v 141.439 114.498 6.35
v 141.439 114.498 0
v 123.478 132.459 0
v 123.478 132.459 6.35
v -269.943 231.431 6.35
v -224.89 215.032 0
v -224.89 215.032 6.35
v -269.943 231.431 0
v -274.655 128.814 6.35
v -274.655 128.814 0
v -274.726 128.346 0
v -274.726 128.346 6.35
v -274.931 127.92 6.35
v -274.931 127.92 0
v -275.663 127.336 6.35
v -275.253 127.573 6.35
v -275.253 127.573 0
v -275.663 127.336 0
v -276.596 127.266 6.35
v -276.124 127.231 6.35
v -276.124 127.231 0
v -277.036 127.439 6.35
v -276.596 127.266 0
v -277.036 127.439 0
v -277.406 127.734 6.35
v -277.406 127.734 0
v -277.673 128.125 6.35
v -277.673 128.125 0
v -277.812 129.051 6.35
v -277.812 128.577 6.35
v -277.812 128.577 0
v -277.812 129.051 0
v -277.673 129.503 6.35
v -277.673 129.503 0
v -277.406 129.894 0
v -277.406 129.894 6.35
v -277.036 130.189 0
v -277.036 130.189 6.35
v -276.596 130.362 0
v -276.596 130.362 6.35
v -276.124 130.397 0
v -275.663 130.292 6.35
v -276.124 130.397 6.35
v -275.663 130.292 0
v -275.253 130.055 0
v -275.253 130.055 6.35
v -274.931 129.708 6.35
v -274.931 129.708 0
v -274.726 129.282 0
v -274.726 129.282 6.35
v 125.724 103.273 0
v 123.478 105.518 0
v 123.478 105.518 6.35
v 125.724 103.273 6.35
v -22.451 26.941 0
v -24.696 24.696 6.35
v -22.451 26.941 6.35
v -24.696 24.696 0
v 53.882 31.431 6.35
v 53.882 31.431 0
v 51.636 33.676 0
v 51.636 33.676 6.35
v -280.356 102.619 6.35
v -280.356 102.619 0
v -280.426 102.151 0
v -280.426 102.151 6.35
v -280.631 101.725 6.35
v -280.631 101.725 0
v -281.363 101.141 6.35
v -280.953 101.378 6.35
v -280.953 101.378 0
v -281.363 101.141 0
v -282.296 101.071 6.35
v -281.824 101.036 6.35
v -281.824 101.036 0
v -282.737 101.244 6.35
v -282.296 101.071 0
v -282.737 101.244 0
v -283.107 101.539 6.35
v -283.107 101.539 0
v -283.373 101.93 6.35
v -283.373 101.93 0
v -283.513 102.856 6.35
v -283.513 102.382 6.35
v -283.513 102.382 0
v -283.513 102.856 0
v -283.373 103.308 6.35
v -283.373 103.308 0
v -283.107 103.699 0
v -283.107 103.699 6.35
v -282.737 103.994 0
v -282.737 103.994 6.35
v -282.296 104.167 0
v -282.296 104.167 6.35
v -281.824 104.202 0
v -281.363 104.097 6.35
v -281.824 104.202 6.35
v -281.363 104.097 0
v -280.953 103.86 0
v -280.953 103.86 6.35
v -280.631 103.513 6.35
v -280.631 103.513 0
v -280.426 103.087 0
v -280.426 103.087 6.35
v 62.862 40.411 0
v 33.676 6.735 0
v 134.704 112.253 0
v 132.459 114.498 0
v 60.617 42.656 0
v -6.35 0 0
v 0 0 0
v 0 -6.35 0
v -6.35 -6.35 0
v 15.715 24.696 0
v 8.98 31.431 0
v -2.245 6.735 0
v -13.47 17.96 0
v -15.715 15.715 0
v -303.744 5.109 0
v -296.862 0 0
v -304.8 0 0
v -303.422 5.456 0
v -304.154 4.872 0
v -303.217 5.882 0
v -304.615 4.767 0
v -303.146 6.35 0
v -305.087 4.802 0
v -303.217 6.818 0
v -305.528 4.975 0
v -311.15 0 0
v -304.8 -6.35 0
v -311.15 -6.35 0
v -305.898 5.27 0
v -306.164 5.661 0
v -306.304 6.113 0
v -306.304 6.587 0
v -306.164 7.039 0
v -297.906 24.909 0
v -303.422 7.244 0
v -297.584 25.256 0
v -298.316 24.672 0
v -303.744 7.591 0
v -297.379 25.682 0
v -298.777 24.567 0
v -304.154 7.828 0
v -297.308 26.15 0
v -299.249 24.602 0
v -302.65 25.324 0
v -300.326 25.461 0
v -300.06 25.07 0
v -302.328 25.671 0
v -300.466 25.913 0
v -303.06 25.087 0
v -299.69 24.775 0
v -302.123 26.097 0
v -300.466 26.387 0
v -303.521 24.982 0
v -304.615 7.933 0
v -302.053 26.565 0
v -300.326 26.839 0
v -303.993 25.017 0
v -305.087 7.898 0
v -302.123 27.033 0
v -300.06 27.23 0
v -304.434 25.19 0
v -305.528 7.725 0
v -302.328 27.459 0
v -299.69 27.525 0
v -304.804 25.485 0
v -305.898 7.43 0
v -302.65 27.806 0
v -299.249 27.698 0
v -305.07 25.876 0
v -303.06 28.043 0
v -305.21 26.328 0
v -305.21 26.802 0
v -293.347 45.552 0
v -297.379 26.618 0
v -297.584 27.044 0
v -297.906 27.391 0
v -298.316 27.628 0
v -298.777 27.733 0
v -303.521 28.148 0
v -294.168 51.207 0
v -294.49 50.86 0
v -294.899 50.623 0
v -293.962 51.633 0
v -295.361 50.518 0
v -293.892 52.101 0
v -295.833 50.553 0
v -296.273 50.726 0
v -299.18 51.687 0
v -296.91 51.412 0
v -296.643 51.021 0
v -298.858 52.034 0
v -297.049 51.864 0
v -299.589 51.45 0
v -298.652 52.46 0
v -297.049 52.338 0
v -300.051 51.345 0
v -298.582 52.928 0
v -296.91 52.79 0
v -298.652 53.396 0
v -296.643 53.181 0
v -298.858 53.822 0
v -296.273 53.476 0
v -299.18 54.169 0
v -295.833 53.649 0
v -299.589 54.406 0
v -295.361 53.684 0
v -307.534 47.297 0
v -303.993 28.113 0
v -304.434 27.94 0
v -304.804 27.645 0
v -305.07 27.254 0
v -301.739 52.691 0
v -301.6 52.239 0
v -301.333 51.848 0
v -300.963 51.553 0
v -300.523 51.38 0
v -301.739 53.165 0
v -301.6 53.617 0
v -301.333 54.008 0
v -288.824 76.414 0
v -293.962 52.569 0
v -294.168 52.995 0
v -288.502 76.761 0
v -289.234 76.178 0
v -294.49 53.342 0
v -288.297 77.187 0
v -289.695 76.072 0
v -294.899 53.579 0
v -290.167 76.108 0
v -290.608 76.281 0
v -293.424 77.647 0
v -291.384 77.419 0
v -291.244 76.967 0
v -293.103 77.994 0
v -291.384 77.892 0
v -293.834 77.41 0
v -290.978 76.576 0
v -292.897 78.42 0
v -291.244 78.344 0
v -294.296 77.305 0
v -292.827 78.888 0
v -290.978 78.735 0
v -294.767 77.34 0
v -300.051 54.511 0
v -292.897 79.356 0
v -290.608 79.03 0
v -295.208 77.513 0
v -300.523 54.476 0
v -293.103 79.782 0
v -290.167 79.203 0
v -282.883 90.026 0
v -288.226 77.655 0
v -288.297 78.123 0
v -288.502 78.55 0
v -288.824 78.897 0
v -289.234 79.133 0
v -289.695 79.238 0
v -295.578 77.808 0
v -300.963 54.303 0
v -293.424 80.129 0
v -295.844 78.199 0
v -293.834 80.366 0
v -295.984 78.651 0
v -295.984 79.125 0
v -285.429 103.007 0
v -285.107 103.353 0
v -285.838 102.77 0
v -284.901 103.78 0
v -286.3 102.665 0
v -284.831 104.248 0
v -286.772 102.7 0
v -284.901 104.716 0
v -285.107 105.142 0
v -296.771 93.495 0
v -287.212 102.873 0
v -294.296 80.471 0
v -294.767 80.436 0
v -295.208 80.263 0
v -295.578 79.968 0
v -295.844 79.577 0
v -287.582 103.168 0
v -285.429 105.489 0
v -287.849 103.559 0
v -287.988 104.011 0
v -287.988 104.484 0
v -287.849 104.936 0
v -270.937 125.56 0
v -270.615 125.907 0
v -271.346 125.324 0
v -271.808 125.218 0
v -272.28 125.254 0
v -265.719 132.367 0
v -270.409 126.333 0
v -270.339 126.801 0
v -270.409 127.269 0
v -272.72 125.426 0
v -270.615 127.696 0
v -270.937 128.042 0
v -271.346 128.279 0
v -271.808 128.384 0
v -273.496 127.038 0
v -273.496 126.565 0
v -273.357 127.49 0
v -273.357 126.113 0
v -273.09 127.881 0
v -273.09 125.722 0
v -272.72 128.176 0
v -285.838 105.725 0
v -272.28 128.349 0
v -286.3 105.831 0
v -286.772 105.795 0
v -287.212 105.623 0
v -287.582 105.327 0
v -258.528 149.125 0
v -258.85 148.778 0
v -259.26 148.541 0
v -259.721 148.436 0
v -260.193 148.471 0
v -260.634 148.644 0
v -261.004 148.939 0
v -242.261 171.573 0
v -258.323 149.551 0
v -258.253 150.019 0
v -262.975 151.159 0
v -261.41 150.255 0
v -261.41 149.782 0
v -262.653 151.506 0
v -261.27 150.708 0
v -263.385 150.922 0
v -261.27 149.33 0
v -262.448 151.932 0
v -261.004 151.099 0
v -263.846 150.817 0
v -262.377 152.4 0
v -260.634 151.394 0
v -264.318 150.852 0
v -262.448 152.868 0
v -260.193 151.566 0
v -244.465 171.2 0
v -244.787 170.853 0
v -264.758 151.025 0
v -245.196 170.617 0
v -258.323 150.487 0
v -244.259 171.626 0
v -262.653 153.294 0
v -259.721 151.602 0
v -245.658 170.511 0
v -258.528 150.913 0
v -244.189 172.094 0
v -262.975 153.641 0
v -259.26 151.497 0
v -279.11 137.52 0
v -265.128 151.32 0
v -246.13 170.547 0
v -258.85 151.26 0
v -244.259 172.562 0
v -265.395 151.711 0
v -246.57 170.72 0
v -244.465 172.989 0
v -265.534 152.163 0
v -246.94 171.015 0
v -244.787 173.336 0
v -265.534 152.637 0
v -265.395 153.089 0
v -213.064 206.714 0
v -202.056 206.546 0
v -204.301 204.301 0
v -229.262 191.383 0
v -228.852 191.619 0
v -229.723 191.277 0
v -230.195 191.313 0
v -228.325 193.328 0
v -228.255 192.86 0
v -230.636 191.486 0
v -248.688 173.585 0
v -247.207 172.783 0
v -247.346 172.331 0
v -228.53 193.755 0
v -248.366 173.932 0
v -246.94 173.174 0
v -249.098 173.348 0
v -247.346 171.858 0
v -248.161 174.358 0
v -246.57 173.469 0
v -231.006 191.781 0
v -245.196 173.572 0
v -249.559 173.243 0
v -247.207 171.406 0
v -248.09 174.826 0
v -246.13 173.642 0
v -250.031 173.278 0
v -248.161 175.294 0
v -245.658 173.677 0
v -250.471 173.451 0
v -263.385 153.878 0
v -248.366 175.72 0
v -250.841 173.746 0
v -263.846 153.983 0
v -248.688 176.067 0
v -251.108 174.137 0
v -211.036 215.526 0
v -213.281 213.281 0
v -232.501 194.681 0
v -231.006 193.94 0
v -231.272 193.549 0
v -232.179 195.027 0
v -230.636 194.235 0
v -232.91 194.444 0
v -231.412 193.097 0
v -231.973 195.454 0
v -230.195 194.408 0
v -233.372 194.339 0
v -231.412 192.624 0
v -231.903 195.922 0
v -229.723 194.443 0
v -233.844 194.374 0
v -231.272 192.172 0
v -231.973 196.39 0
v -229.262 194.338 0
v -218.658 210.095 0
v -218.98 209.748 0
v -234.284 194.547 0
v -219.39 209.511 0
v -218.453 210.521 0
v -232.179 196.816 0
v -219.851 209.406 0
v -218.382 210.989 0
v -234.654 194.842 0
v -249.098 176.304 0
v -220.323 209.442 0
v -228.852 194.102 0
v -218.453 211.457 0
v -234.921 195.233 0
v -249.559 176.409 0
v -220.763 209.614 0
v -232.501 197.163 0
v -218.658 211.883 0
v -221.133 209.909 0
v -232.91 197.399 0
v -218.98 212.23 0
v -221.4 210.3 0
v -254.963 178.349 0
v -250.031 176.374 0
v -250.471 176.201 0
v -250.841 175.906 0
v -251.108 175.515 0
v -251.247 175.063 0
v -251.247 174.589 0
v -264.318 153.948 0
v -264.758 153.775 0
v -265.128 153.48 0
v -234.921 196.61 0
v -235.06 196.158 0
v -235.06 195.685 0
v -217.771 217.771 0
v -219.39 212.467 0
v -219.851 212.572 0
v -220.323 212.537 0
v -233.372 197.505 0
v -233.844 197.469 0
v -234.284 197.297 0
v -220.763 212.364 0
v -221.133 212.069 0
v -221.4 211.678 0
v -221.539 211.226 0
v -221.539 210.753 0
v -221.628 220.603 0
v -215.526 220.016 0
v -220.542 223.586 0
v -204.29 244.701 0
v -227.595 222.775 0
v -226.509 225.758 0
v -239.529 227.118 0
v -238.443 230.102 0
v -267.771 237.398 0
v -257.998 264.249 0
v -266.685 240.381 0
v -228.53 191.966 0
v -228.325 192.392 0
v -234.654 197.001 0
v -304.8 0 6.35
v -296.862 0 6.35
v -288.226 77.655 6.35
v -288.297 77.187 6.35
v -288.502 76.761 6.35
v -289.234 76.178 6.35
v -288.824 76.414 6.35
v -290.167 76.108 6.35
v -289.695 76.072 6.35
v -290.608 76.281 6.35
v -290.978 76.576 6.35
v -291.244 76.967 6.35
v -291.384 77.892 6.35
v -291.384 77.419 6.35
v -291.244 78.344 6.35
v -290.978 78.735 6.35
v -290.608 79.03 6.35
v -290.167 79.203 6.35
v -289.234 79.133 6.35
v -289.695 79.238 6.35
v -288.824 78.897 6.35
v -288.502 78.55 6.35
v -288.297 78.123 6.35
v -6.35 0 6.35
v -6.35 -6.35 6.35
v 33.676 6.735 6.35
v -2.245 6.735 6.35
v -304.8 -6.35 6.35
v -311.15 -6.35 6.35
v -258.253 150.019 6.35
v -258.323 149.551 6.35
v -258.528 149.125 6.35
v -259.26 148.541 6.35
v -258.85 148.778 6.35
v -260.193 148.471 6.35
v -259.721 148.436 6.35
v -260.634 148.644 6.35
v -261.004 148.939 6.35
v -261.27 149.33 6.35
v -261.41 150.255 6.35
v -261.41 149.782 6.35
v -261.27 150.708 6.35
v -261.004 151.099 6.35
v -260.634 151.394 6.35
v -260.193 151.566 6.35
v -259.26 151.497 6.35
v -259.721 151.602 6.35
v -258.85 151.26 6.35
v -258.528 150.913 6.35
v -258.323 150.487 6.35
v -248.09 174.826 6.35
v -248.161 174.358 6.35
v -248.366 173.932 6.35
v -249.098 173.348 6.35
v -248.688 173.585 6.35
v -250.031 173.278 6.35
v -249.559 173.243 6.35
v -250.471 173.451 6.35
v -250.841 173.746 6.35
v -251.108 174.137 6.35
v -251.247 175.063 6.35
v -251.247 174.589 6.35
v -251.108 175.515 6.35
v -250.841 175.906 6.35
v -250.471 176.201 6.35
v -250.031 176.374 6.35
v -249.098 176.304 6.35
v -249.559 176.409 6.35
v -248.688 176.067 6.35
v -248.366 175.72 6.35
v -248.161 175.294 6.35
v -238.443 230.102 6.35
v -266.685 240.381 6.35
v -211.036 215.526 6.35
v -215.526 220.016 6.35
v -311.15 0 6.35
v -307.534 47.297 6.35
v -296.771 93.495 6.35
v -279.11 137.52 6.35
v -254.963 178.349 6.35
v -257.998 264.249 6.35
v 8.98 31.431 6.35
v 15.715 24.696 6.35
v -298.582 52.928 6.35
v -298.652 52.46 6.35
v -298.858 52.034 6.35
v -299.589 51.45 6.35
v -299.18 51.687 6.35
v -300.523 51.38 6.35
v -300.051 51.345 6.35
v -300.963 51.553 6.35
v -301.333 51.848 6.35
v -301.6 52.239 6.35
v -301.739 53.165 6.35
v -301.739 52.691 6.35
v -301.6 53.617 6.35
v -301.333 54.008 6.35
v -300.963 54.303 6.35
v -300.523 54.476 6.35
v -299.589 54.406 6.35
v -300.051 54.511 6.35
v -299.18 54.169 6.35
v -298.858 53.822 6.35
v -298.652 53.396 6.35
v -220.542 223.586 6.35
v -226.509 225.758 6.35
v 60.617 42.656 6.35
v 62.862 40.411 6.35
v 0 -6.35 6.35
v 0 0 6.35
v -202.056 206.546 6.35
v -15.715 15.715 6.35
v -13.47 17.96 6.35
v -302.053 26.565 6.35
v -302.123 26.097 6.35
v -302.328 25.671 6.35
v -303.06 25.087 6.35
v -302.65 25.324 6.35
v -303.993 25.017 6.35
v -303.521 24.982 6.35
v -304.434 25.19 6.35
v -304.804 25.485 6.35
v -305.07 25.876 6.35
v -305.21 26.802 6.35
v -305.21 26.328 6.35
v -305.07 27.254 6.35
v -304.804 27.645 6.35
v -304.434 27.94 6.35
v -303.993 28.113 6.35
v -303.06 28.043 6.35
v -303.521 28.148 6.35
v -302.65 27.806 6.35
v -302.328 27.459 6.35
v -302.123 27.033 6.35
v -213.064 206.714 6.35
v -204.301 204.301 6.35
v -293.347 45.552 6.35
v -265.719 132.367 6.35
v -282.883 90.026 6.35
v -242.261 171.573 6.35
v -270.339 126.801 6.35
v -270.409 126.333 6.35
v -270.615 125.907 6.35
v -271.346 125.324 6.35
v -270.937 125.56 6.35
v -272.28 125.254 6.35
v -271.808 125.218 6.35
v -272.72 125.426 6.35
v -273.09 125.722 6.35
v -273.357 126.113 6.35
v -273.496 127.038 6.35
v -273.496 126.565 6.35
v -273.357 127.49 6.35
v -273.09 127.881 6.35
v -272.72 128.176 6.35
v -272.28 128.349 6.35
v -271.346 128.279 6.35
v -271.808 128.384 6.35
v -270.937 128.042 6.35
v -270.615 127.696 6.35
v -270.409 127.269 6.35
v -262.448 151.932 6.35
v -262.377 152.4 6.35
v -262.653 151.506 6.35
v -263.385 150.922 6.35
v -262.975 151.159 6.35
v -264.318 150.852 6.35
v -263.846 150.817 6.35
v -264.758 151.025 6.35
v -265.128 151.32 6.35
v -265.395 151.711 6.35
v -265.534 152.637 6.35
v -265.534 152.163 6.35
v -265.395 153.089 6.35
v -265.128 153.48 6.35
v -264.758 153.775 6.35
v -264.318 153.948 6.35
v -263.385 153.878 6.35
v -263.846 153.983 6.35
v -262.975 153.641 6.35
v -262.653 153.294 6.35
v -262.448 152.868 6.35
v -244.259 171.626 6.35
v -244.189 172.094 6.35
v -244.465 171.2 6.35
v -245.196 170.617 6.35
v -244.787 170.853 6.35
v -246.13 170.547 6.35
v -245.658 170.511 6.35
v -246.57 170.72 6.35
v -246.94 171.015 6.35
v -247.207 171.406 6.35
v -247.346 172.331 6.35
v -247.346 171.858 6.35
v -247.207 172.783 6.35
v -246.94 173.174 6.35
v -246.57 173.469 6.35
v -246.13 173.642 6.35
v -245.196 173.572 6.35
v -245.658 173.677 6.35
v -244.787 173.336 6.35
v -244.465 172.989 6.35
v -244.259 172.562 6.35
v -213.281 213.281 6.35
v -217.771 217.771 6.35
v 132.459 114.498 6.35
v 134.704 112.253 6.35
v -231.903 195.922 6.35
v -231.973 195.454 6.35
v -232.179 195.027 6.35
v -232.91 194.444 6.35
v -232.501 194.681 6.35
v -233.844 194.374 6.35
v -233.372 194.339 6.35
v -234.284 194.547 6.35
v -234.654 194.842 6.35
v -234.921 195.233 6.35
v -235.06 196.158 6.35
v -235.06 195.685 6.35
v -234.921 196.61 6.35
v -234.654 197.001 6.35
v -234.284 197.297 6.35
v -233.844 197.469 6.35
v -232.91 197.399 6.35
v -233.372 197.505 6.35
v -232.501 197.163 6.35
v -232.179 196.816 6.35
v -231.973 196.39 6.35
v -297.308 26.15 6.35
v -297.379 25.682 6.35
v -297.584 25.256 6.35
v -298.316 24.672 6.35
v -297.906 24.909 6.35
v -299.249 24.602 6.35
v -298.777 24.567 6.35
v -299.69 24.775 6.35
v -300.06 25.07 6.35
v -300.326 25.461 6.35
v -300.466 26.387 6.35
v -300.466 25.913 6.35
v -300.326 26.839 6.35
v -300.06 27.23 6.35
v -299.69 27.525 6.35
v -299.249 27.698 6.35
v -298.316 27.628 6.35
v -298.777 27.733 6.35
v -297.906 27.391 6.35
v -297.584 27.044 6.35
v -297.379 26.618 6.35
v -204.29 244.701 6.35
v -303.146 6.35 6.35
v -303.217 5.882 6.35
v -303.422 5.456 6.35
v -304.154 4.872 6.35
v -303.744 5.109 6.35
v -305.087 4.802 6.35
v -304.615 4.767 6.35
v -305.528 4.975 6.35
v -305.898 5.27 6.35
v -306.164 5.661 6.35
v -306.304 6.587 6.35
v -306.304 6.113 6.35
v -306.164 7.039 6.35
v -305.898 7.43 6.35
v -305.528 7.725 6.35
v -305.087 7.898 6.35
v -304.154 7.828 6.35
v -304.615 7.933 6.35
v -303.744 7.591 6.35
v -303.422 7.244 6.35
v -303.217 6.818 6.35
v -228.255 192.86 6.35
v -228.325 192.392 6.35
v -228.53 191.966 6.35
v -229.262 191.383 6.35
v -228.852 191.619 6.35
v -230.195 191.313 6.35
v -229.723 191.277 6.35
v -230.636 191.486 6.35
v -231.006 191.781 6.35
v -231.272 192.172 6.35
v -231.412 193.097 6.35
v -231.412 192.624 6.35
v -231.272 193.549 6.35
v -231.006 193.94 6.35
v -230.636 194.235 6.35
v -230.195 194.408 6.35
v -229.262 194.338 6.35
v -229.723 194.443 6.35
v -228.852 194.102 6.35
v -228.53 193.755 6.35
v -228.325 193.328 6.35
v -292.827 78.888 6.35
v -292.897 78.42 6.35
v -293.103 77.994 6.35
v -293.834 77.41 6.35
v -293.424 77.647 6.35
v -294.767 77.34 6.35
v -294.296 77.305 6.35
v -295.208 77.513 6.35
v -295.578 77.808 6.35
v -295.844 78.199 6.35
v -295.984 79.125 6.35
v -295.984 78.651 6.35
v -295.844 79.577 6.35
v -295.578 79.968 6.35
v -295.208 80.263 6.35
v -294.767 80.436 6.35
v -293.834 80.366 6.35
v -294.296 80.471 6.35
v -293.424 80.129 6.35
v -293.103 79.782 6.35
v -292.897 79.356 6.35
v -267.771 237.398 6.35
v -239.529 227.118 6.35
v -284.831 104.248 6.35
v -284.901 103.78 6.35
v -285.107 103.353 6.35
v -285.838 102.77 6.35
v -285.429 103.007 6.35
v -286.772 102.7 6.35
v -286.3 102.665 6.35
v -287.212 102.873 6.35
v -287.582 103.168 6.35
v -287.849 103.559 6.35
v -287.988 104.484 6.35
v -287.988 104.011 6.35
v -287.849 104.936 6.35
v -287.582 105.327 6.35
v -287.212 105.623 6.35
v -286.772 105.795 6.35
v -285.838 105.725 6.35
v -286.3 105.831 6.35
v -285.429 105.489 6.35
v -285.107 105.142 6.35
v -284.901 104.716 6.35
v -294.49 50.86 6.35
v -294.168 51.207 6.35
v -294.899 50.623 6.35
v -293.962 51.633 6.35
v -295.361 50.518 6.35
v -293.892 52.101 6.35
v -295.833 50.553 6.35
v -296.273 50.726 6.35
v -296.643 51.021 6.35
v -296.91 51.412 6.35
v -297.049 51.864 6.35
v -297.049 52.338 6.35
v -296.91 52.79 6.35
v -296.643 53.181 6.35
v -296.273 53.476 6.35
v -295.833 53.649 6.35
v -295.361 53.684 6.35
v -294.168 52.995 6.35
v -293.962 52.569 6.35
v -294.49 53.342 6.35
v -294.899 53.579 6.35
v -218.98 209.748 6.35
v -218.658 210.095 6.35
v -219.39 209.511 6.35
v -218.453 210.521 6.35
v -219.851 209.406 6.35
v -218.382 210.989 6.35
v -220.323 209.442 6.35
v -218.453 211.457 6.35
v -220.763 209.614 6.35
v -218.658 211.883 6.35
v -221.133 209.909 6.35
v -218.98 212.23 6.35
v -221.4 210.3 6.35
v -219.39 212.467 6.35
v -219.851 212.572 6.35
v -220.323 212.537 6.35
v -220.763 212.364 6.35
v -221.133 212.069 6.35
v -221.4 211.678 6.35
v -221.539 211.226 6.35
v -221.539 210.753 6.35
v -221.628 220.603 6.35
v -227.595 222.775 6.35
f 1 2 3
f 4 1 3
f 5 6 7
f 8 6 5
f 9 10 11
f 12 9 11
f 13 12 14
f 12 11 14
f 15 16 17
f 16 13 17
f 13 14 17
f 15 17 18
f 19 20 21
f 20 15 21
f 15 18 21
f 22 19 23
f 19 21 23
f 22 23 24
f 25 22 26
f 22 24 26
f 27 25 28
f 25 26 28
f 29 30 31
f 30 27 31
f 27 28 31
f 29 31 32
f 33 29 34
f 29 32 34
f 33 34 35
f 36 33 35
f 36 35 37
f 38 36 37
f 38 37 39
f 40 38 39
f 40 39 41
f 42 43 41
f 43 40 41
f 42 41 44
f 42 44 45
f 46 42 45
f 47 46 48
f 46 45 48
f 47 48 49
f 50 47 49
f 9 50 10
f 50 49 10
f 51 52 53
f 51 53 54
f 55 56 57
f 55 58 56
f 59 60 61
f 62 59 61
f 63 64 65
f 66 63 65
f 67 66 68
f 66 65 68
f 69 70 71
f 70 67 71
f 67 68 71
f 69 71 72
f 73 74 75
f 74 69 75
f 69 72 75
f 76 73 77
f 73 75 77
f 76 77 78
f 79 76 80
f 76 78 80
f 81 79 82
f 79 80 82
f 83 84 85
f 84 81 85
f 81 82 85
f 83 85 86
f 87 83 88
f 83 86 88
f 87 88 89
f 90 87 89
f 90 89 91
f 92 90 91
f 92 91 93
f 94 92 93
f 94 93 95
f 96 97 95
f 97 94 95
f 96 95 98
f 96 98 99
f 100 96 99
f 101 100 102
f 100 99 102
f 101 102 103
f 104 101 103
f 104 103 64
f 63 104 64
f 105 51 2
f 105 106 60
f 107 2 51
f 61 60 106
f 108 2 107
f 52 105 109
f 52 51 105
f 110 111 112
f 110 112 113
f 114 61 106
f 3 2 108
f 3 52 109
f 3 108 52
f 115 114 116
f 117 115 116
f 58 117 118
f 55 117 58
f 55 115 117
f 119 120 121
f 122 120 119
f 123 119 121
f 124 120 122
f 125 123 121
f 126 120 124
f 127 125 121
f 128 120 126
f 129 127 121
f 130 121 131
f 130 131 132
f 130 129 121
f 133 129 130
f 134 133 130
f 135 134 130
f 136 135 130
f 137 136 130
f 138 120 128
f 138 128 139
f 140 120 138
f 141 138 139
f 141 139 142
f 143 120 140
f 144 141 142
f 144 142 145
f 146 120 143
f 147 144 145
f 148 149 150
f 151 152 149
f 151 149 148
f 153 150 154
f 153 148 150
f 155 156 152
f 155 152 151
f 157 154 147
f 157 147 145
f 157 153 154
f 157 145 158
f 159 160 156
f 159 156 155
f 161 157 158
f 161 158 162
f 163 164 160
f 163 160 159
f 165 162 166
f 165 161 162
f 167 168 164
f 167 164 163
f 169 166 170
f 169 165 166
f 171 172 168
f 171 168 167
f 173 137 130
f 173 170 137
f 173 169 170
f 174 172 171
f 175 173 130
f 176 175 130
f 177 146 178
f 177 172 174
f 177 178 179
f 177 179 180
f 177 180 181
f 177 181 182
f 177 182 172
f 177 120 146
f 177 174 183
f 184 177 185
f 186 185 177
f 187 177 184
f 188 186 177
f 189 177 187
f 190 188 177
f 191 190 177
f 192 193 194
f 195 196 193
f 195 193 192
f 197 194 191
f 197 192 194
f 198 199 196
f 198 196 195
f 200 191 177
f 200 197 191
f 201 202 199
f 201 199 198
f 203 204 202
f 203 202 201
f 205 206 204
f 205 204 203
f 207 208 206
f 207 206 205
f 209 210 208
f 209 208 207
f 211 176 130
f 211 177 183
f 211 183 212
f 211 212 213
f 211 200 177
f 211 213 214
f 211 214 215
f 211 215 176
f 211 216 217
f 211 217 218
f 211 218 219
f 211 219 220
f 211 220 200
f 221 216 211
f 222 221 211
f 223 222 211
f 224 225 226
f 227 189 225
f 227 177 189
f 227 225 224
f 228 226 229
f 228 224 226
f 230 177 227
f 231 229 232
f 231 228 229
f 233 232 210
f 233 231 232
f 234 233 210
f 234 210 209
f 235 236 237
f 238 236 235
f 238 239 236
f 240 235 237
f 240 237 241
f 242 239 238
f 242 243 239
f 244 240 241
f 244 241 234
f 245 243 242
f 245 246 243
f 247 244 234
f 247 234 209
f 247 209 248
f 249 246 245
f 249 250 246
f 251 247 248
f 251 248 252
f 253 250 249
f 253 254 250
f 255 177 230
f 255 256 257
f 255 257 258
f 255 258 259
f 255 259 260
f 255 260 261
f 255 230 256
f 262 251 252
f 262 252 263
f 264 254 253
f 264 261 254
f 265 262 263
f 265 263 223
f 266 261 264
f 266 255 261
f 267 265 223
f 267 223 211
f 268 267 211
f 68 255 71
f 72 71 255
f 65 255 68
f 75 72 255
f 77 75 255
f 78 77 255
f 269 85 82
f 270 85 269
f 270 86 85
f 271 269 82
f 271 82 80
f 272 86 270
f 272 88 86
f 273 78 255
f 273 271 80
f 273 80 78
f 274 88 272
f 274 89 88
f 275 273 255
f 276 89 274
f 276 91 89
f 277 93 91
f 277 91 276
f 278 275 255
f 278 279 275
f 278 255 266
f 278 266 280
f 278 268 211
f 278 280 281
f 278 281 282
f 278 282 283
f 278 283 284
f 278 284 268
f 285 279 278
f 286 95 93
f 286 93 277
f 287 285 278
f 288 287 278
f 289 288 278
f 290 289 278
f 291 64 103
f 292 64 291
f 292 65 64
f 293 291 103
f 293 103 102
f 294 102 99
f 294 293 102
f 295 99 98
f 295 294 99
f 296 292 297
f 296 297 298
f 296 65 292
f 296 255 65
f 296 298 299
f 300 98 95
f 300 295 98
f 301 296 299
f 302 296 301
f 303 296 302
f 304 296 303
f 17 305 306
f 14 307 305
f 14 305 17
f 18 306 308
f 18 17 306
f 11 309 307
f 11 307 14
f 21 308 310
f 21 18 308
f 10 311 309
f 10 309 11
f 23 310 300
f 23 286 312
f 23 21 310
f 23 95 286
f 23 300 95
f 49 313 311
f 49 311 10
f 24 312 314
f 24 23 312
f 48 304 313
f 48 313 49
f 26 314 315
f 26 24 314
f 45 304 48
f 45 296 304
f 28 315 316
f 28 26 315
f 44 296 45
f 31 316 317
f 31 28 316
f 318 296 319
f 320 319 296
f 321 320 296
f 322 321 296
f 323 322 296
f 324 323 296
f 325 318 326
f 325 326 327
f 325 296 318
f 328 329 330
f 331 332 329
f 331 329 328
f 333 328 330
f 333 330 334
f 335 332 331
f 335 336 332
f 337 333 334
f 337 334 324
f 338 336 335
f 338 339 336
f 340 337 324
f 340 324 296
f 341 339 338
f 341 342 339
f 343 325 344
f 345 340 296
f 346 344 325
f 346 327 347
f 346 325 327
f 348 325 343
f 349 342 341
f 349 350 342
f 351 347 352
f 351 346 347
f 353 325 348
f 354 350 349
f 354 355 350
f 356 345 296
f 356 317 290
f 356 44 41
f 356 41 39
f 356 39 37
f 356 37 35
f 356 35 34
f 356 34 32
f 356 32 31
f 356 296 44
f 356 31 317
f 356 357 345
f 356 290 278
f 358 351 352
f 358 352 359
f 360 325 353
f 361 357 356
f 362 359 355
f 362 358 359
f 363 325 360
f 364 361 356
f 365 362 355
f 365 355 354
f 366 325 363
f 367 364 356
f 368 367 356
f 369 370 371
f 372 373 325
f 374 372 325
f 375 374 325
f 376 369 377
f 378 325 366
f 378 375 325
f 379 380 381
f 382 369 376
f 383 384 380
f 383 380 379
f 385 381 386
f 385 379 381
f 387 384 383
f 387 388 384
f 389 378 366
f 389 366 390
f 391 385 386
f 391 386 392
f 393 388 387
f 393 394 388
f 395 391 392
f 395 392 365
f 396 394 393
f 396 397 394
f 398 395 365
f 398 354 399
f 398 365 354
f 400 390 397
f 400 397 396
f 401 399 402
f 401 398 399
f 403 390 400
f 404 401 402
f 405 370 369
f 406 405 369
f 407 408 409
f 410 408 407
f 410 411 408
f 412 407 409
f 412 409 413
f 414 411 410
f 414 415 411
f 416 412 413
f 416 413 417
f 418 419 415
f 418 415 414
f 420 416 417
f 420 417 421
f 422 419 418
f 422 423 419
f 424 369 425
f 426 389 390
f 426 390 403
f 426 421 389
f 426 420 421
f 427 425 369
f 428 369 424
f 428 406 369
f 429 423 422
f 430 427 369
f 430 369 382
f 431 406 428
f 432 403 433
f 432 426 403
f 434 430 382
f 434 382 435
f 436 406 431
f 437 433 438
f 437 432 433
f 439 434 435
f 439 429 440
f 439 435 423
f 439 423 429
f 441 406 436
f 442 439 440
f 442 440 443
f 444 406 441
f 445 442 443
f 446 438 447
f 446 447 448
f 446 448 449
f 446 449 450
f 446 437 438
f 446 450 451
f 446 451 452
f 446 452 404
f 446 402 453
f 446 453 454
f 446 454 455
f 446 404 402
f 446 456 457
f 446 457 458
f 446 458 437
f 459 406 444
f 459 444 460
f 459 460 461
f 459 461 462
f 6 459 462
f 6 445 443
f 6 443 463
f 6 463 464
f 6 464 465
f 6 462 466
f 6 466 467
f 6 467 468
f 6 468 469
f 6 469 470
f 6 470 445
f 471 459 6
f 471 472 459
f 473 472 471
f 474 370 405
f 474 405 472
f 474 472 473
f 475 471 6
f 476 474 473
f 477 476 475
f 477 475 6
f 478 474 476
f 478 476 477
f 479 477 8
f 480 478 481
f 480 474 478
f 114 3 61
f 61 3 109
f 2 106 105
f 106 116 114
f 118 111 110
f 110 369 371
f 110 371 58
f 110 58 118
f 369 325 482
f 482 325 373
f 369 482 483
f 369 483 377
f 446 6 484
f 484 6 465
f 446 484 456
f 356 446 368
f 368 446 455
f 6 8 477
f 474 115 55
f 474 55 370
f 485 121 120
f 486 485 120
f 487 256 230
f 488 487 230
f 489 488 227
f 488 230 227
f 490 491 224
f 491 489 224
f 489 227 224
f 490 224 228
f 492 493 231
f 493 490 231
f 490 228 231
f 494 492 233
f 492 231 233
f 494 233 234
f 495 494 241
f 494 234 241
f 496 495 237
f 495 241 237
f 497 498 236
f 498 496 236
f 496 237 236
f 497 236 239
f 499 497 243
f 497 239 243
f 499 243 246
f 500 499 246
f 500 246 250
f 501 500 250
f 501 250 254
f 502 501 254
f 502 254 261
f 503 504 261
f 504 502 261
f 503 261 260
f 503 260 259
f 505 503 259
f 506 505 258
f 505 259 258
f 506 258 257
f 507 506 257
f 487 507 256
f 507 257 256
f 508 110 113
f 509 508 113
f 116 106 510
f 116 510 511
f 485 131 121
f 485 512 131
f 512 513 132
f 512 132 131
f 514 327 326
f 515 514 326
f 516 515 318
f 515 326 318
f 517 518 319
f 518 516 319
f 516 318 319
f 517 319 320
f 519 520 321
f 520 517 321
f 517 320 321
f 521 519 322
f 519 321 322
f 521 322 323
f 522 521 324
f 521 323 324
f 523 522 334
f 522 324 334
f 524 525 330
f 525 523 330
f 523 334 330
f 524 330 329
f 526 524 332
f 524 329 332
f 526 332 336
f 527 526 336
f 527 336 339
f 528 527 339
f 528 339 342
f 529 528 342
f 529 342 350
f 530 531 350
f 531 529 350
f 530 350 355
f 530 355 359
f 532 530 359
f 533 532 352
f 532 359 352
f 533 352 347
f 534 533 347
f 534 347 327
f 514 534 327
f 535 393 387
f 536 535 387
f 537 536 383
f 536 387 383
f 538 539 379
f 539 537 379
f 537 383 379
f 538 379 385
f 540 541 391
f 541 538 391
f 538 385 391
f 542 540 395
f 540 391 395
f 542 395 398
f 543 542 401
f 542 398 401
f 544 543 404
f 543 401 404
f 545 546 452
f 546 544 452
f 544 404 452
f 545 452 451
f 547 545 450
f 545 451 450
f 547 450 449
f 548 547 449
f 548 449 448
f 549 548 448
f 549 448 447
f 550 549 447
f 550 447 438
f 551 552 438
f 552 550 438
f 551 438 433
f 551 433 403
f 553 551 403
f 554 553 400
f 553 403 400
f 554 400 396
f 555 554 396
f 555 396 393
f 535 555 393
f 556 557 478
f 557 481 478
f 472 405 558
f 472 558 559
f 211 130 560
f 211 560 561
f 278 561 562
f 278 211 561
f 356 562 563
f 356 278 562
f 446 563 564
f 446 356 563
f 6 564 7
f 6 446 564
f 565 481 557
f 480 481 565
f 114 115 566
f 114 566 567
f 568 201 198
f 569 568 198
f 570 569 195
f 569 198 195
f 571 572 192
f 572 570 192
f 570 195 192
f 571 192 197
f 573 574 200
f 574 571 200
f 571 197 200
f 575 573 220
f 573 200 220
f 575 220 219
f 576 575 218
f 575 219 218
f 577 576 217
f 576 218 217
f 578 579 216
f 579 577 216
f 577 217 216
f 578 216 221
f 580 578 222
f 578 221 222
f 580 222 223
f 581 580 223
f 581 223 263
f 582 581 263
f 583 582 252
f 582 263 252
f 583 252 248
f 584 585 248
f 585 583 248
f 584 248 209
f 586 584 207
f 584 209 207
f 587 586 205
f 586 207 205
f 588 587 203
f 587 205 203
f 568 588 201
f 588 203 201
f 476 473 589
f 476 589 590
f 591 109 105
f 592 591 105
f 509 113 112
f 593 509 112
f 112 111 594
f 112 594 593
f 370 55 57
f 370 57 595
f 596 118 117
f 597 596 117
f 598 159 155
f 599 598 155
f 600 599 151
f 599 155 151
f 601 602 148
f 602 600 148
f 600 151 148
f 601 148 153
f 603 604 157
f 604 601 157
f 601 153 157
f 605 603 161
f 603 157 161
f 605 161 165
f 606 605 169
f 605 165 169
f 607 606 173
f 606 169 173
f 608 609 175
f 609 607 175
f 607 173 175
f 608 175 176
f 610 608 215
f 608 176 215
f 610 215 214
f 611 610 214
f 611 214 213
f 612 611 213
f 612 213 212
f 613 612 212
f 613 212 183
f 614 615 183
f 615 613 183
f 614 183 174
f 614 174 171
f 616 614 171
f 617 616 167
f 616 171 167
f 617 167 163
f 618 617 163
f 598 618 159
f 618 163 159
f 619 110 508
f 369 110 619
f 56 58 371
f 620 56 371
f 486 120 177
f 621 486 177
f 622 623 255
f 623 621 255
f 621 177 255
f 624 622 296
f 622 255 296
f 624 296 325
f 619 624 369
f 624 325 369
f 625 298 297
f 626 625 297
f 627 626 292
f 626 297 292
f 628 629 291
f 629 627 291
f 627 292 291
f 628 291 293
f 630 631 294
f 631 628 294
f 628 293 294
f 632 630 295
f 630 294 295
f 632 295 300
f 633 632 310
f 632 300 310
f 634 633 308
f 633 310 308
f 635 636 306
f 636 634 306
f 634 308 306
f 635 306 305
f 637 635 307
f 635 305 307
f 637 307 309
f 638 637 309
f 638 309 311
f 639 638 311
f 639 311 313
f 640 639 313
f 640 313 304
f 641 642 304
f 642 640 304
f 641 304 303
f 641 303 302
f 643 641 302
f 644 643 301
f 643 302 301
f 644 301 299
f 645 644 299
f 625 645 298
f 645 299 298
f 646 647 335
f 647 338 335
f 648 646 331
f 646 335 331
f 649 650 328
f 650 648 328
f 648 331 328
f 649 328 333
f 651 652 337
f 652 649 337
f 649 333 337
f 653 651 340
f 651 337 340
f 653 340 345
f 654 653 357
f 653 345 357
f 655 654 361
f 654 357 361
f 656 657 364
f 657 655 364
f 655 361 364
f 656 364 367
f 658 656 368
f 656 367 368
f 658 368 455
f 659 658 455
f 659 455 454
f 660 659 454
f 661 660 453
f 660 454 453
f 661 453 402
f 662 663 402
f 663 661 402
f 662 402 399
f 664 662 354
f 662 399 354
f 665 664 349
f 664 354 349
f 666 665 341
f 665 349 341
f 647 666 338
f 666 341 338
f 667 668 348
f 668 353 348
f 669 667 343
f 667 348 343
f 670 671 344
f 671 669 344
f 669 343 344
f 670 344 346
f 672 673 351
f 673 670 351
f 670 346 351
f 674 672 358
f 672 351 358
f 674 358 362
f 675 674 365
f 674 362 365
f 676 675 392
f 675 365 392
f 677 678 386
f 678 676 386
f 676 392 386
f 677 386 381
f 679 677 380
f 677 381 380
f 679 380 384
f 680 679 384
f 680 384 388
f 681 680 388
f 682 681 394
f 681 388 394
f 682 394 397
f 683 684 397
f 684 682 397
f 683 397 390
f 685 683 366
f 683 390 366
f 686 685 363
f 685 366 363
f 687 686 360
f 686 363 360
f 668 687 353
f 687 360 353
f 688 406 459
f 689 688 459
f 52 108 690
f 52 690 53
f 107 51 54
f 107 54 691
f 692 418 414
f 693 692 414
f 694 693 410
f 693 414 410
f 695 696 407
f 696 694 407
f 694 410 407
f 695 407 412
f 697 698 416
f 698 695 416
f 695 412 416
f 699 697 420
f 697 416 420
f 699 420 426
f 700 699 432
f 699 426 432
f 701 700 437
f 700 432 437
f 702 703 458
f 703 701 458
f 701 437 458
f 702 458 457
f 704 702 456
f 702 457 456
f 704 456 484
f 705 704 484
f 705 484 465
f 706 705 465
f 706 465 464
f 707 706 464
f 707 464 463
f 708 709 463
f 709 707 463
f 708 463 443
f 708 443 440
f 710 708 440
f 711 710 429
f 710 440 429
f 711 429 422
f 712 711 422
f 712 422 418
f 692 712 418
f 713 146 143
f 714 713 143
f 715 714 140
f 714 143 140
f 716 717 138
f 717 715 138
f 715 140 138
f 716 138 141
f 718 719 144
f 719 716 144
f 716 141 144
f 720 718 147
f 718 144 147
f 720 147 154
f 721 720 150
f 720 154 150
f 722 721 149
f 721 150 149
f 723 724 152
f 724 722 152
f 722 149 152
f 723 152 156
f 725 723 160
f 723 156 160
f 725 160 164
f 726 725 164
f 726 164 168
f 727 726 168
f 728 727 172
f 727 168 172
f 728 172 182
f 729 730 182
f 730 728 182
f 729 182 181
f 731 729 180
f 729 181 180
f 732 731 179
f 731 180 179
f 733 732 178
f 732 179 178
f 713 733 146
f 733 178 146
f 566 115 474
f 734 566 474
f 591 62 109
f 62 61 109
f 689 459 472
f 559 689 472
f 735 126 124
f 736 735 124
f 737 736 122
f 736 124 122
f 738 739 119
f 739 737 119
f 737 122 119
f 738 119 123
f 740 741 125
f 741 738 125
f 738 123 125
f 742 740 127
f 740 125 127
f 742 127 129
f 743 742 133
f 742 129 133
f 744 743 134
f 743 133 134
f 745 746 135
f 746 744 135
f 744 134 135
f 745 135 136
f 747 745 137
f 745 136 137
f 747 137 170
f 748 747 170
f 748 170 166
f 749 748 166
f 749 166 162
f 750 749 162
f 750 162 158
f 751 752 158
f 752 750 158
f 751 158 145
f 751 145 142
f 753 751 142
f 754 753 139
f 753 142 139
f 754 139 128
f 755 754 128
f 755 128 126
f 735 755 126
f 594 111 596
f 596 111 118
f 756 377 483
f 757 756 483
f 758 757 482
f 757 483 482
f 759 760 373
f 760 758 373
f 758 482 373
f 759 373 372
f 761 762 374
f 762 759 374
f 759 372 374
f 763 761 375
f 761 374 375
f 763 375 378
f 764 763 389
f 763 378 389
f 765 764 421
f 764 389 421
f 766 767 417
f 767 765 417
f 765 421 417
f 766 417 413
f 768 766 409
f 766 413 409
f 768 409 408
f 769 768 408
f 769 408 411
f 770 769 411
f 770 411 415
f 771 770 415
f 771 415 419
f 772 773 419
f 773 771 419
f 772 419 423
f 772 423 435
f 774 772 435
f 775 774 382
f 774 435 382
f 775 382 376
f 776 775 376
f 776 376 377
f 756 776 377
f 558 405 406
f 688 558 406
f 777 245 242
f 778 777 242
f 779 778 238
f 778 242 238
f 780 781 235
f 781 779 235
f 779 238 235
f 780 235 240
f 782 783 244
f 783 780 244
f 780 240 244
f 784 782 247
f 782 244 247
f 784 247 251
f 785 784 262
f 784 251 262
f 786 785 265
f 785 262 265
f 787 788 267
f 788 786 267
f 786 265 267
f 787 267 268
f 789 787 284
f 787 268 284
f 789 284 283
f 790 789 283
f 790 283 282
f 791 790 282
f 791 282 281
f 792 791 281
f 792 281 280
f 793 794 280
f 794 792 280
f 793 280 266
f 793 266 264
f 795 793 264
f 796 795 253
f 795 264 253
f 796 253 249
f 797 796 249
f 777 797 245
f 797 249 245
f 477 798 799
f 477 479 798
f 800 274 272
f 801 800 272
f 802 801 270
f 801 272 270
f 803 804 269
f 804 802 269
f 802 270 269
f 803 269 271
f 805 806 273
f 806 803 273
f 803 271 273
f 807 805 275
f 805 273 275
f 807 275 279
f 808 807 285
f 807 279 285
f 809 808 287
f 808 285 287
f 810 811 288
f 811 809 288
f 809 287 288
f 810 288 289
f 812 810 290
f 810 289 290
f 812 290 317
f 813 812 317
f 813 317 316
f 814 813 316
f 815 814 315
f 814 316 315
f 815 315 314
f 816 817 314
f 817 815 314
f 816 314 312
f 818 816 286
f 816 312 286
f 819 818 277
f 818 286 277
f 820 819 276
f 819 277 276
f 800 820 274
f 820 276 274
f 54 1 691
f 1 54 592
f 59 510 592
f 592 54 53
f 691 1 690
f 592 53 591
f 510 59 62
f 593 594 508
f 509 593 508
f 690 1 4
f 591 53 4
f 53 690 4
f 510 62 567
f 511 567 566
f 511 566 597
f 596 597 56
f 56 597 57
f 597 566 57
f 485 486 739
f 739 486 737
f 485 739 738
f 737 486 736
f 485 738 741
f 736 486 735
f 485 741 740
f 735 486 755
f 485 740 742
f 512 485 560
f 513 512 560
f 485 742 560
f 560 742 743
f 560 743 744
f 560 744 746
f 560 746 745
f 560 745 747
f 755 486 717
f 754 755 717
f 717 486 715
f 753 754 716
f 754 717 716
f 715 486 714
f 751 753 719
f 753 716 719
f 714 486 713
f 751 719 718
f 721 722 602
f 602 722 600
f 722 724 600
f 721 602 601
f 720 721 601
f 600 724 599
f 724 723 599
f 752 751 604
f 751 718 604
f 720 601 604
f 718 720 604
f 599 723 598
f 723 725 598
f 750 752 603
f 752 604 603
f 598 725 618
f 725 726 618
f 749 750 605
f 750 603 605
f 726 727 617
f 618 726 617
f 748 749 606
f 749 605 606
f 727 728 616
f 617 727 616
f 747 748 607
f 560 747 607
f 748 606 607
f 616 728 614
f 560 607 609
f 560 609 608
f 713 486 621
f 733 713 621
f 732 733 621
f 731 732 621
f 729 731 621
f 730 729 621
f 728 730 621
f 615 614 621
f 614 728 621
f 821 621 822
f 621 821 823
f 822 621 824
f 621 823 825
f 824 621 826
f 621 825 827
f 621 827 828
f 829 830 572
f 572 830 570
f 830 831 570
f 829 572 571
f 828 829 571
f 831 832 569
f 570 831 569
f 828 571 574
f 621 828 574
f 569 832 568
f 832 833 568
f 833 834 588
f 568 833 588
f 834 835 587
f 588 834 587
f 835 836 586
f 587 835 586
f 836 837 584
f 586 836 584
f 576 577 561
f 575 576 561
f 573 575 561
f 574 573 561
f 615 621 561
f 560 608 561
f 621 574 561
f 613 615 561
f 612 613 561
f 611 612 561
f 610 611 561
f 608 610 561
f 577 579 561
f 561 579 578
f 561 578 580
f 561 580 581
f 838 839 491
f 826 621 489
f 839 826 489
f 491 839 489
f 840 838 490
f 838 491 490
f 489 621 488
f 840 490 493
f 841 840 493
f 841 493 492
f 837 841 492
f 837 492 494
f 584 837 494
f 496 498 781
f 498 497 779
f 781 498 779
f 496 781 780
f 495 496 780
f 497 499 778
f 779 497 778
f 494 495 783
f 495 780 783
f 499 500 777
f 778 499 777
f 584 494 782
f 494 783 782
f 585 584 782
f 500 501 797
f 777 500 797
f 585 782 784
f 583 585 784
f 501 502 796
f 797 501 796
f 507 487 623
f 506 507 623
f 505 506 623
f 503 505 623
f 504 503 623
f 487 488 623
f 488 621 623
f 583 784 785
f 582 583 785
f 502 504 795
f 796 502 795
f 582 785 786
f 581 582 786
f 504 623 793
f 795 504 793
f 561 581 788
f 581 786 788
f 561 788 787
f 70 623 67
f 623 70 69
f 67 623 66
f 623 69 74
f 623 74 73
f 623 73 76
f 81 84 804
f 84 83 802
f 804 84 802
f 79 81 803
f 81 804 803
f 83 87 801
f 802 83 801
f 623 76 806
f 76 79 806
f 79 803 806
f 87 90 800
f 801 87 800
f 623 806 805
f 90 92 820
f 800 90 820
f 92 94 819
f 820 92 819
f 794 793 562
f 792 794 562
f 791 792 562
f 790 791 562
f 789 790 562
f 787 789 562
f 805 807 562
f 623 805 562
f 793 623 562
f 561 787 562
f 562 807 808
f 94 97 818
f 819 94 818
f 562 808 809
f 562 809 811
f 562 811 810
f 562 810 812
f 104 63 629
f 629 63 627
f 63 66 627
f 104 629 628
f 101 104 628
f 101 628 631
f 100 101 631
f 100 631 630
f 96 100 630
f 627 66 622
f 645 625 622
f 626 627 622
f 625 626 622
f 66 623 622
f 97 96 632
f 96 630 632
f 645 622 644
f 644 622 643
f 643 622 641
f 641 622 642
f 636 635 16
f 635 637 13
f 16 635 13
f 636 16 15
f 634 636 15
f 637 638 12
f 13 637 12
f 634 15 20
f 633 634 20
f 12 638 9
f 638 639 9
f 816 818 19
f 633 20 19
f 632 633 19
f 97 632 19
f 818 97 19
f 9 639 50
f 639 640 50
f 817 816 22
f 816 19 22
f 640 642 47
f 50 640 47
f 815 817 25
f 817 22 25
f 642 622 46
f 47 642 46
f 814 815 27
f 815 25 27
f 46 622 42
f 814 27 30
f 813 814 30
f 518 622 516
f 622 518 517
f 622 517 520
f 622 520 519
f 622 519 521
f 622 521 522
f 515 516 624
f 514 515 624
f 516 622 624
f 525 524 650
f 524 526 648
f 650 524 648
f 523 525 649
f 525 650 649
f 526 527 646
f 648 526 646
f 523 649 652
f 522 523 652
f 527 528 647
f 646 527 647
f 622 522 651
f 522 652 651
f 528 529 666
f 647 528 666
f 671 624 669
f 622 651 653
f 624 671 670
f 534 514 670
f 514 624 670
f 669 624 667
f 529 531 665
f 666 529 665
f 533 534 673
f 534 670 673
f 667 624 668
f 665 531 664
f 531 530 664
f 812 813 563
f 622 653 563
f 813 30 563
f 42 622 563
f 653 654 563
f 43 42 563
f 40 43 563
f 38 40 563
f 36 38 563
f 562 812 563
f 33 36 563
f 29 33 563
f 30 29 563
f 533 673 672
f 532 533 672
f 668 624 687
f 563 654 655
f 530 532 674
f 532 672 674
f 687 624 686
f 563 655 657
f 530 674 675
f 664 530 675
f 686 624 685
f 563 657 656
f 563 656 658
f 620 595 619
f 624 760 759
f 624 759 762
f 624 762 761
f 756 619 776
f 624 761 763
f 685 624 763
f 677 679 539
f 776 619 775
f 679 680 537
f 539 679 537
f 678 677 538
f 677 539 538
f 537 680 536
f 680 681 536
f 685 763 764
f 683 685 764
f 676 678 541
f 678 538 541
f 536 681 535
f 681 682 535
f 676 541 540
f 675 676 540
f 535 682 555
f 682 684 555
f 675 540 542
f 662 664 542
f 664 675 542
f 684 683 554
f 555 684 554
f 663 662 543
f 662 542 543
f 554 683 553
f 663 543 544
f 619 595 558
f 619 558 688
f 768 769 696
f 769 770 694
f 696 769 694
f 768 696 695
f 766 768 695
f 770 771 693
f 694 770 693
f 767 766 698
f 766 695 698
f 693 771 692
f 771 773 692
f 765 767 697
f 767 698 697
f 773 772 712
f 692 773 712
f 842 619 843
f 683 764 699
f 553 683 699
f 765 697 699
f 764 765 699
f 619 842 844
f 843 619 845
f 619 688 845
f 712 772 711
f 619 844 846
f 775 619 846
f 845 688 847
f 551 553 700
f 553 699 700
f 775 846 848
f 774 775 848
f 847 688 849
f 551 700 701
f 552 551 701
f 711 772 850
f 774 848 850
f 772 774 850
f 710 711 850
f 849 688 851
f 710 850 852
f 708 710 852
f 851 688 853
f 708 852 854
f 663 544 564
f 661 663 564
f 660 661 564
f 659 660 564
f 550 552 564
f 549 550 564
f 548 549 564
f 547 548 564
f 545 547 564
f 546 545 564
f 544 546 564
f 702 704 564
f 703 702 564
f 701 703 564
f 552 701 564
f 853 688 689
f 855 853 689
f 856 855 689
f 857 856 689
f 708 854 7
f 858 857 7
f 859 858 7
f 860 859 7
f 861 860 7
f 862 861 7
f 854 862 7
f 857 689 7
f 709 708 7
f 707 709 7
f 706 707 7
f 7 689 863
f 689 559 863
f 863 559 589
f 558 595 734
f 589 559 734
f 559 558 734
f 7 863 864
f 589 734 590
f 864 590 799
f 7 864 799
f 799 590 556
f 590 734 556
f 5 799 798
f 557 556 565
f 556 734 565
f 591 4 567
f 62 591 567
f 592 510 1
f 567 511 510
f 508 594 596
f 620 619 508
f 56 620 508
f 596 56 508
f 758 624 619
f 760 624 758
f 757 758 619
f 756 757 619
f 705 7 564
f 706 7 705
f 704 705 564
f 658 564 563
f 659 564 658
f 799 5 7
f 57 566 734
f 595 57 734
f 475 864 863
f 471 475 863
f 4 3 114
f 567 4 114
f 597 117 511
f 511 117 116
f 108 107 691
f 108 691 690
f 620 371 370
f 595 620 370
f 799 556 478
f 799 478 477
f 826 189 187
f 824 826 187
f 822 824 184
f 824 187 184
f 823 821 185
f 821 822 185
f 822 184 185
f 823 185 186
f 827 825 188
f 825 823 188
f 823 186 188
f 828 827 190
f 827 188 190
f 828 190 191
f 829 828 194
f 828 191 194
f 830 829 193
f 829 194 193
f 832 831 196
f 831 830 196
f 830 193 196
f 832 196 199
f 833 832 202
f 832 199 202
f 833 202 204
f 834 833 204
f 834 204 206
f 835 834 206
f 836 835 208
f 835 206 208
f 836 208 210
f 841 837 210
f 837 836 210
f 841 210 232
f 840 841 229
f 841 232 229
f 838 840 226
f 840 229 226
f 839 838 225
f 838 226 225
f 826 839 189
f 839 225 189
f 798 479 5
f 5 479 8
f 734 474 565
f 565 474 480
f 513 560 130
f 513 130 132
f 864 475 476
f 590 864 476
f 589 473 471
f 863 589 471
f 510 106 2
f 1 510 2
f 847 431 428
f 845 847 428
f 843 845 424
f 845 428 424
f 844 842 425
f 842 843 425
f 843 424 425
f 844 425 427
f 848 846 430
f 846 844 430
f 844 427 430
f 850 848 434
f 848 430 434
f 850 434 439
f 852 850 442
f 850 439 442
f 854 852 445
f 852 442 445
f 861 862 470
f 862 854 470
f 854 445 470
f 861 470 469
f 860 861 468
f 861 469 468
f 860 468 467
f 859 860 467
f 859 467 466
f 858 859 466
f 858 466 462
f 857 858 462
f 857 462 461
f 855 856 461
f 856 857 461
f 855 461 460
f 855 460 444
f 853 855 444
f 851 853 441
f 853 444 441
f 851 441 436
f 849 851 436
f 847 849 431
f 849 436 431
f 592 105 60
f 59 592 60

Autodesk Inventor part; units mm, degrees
ref_plane "YZ Plane" through (0, 0, 0) normal (1, 0, 0) x (0, 1, 0)
ref_plane "XZ Plane" through (0, 0, 0) normal (0, 1, 0) x (-1, 0, 0)
ref_plane "XY Plane" through (0, 0, 0) normal (0, 0, 1) x (1, 0, 0)
sketch "Sketch1" plane through (0, 0, 0) normal (0, 0, 1) x (1, 0, 0)
  circle A0 centre (-295.4793, 52.101) radius 1.5875
  circle A1 centre (-281.943, 102.6189) radius 1.5875
  circle A2 centre (-259.8401, 150.0188) radius 1.5875
  circle A3 centre (-229.8421, 192.8604) radius 1.5875
  circle A4 centre (-219.9695, 210.9892) radius 1.5875
  circle A5 centre (-300.1694, 52.928) radius 1.5875
  circle A6 centre (-286.4183, 104.2477) radius 1.5875
  circle A7 centre (-263.9645, 152.4) radius 1.5875
  circle A8 centre (-233.4903, 195.9217) radius 1.5875
  circle A9 centre (-249.6775, 174.8261) radius 1.5875
  circle A10 centre (-276.2426, 128.814) radius 1.5875
  circle A11 centre (-294.4142, 78.888) radius 1.5875
  circle A12 centre (-303.6401, 26.5651) radius 1.5875
  circle A13 centre (-304.7338, 6.35) radius 1.5875
  circle A14 centre (-245.7763, 172.0944) radius 1.5875
  circle A15 centre (-271.9263, 126.8013) radius 1.5875
  circle A16 centre (-289.814, 77.6554) radius 1.5875
  circle A17 centre (-298.8958, 26.15) radius 1.5875
  arc A18 (-220.0163, 220.0163) -> (-311.15, 0) centre (0, 0) ccw
  line L0 (-311.15, 0) -> (0, 0)
  line L1 (0, 0) -> (-220.0163, 220.0163)
  arc A19 (-209.9135, 209.9135) -> (-296.8625, 0) centre (0, 0) ccw
  arc A20 (-220.0163, 220.0163) -> (-311.15, 0) centre (0, 0) ccw
  dimension "d0" = 593.725
extrude "Extrusion1" add sketch "Sketch1" along normal blind 6.35 contours L1 A19 L0 A18
sketch "Sketch2" plane through (0, 0, 6.35) normal (0, 0, 1) x (1, 0, 0)
  arc A0 (-220.0163, 220.0163) -> (-311.15, 0) centre (0, 0) ccw projected
  line L0 (-311.15, 0) -> (-296.8625, 0) projected
  line L1 (-311.15, 0) -> (-311.15, -6.35)
  line L2 (-311.15, -6.35) -> (-304.8, -6.35)
  line L3 (-304.8, -6.35) -> (-304.8, 0)
  dimension "d3" = 6.35
  dimension "d4" = 6.35
extrude "Extrusion2" add sketch "Sketch2" against normal blind 6.35
sketch "Sketch3" plane through (0, 0, 0) normal (0, 0, -1) x (-1, 0, 0)
  arc A0 (311.15, 0) -> (220.0163, 220.0163) centre (0, 0) ccw projected
  line L0 (311.15, -6.35) -> (311.15, 0) projected
  line L1 (220.0163, 220.0163) -> (177.0122, 220.0163)
  circle A1 centre (281.943, 102.6189) radius 1.5875 projected
  circle A2 centre (263.9645, 152.4) radius 1.5875 projected
  circle A3 centre (276.2426, 128.814) radius 1.5875 projected
  circle A4 centre (245.7763, 172.0944) radius 1.5875 projected
  circle A5 centre (249.6775, 174.8261) radius 1.5875 projected
  circle A6 centre (286.4183, 104.2477) radius 1.5875 projected
  circle A7 centre (295.4793, 52.101) radius 1.5875 projected
  circle A8 centre (259.8401, 150.0188) radius 1.5875 projected
  circle A9 centre (233.4903, 195.9217) radius 1.5875 projected
  circle A10 centre (294.4142, 78.888) radius 1.5875 projected
  circle A11 centre (289.814, 77.6554) radius 1.5875 projected
  circle A12 centre (271.9263, 126.8013) radius 1.5875 projected
  circle A13 centre (300.1694, 52.928) radius 1.5875 projected
  circle A14 centre (219.9695, 210.9892) radius 1.5875 projected
  circle A15 centre (229.8421, 192.8604) radius 1.5875 projected
  arc A16 (311.15, 0) -> (224.8896, 215.0325) centre (0, 0) ccw projected
  line L2 (224.8896, 215.0325) -> (296.2163, 240.9933) projected
  line L3 (296.2163, 240.9933) -> (296.2163, 247.7508) projected
  line L4 (296.2163, 247.7508) -> (220.0163, 220.0163) projected
  line L5 (220.0163, 220.0163) -> (209.9135, 209.9135) projected
  arc A17 (293.5158, 44.45) -> (209.9135, 209.9135) centre (0, 0) ccw projected
  line L6 (293.5158, 44.45) -> (301.625, 44.45) projected
  line L7 (301.625, 44.45) -> (301.625, 0) projected
  line L8 (301.625, 0) -> (304.8, 0) projected
  line L9 (304.8, 0) -> (304.8, -6.35) projected
  line L10 (304.8, -6.35) -> (311.15, -6.35) projected
  line L11 (311.15, -6.35) -> (311.15, 0) projected
extrude "Extrusion3" add sketch "Sketch3" against normal blind 6.35 contours A0 L4 L3 L2
sketch "Sketch4" plane through (0, 0, 0) normal (0, 0, -1) x (-1, 0, 0)
  line L0 (209.9135, 209.9135) -> (220.0163, 220.0163) projected
  arc A0 (296.8625, 0) -> (209.9135, 209.9135) centre (0, 0) ccw projected
  arc A1 (311.15, 0) -> (224.8896, 215.0325) centre (0, 0) ccw projected
  line L1 (0, 0) -> (209.9135, 209.9135)
  line L2 (6.35, -6.35) -> (0, -6.35) projected
  line L3 (6.35, 0) -> (6.35, -6.35) projected
  line L4 (0, 0) -> (6.35, 0) projected
  line L5 (0, 0) -> (0, -6.35) projected
  line L6 (0, -6.35) -> (0, 0)
  line L7 (0, -6.35) -> (6.35, -6.35)
  line L8 (6.35, 0) -> (6.35, -6.35)
  line L9 (6.35, 0) -> (213.0645, 206.7145)
extrude "Extrusion4" add sketch "Sketch4" against normal blind 6.35
sketch "Sketch7" plane through (0, 0, 0) normal (0, 0, -1) x (-1, 0, 0)
  line L0 (220.0163, 220.0163) -> (0, 0) projected
  line L1 (296.2163, 247.7508) -> (220.0163, 220.0163) projected
  line L2 (0, 0) -> (220.0163, 220.0163) projected
  line L3 (202.0558, 206.5459) -> (211.036, 215.5261) projected
  line L4 (204.3008, 204.3008) -> (202.0558, 206.5459) projected
  line L5 (213.2811, 213.2811) -> (204.3008, 204.3008) projected
  line L6 (211.036, 215.5261) -> (213.2811, 213.2811) projected
  line L7 (-134.4395, 156.8901) -> (11.2253, 11.2253) projected
  line L8 (8.9803, 13.4704) -> (13.4704, 17.9605) projected
  line L9 (15.7154, 15.7154) -> (13.4704, 17.9605)
  line L10 (13.4704, 17.9605) -> (8.9803, 13.4704)
  line L11 (8.9803, 13.4704) -> (-8.9803, 31.4309)
  line L12 (15.7154, 15.7154) -> (24.6957, 24.6957)
  line L13 (24.6957, 24.6957) -> (22.4506, 26.9408)
  line L14 (22.4506, 26.9408) -> (202.0558, 206.5459)
  line L15 (202.0558, 206.5459) -> (204.3008, 204.3008)
  line L16 (204.3008, 204.3008) -> (213.2811, 213.2811)
  line L17 (213.2811, 213.2811) -> (211.036, 215.5261)
  line L18 (220.0163, 220.0163) -> (216.1966, 226.012)
  line L19 (211.036, 215.5261) -> (218.2689, 222.7591)
  line L20 (218.2689, 222.7591) -> (204.2902, 244.7013)
  line L21 (-8.9803, 31.4309) -> (204.2902, 244.7013)
  line L22 (204.3008, 204.3008) -> (202.0558, 206.5459) projected
  line L23 (211.036, 215.5261) -> (213.2811, 213.2811) projected
  line L24 (202.0558, 206.5459) -> (211.036, 215.5261) projected
  line L25 (213.2811, 213.2811) -> (204.3008, 204.3008) projected
  point P0 (8.9803, 8.9803)
  dimension "d19" = 25.4
  dimension "d20" = 102.5
extrude "Extrusion7" add sketch "Sketch7" against normal blind 6.35 contours L0 L4 L3 L6 | L19 L3 L14 L13 L0 L9 L8 L7 L21 L20 L18
sketch "Sketch8" plane through (0, 0, 0) normal (0, 0, -1) x (-1, 0, 0)
  line L0 (211.036, 215.5261) -> (218.2689, 222.7591) projected
  line L1 (218.2689, 222.7591) -> (204.2902, 244.7013) projected
  line L2 (296.2163, 247.7508) -> (220.0163, 220.0163) projected
  line L3 (238.4434, 230.102) -> (239.5293, 227.1184) projected
  line L4 (226.5093, 225.7583) -> (238.4434, 230.102) projected
  line L5 (227.5952, 222.7748) -> (226.5093, 225.7583) projected
  line L6 (239.5293, 227.1184) -> (227.5952, 222.7748) projected
  line L7 (220.5423, 223.5865) -> (221.6282, 220.603) projected
  line L8 (290.2492, 245.579) -> (278.3151, 241.2353) projected
  line L9 (289.1633, 248.5625) -> (290.2492, 245.579) projected
  line L10 (277.2292, 244.2188) -> (289.1633, 248.5625) projected
  line L11 (278.3151, 241.2353) -> (277.2292, 244.2188) projected
  line L12 (217.7712, 217.7712) -> (215.5261, 220.0163) projected
  line L13 (218.2689, 222.7591) -> (215.5261, 220.0163)
  line L14 (215.5261, 220.0163) -> (217.7712, 217.7712)
  line L15 (217.7712, 217.7712) -> (220.0163, 220.0163)
  line L16 (221.6282, 220.603) -> (220.0465, 220.0273)
  line L17 (221.6282, 220.603) -> (220.5423, 223.5865)
  line L18 (204.2902, 244.7013) -> (286.443, 274.6025)
  line L19 (295.1304, 250.7343) -> (296.2163, 247.7508) projected
  line L20 (295.1304, 250.7343) -> (286.443, 274.6025)
  line L21 (218.2689, 222.7591) -> (204.2902, 244.7013)
  line L22 (295.1304, 250.7343) -> (289.1633, 248.5625)
  line L23 (289.1633, 248.5625) -> (290.2492, 245.579)
  line L24 (290.2492, 245.579) -> (278.3151, 241.2353)
  line L25 (278.3151, 241.2353) -> (277.2292, 244.2188)
  line L26 (277.2292, 244.2188) -> (238.4434, 230.102)
  line L27 (238.4434, 230.102) -> (239.5293, 227.1184)
  line L28 (239.5293, 227.1184) -> (227.5952, 222.7748)
  line L29 (226.5093, 225.7583) -> (227.5952, 222.7748)
  line L30 (220.5423, 223.5865) -> (226.5093, 225.7583)
extrude "Extrusion8" add sketch "Sketch8" against normal blind 6.35 contours L0 L1 L18 L20 L22 L10 L26 L4 L30 L7 L2 L15 L12 | L9 L2 L11 L10 | L5 L4 L3 L2
sketch "Sketch11" plane through (0, 0, 0) normal (0, 0, -1) x (-1, 0, 0)
  line L0 (-8.9803, 31.4309) -> (8.9803, 13.4704) projected
  line L1 (296.2163, 240.9933) -> (296.2163, 247.7508) projected
  line L2 (204.3008, 204.3008) -> (24.6957, 24.6957) projected
  line L3 (-8.9803, 31.4309) -> (-33.676, 6.7352)
  line L4 (8.9803, 13.4704) -> (2.2451, 6.7352)
  line L5 (-33.676, 6.7352) -> (2.2451, 6.7352)
  dimension "d35" = 34.925
extrude "Extrusion11" add sketch "Sketch11" against normal blind 6.35
sketch "Sketch12" plane through (0, 0, 0) normal (0, 0, -1) x (-1, 0, 0)
  line L0 (204.2902, 244.7013) -> (-33.676, 6.7352) projected
  line L1 (204.3008, 204.3008) -> (24.6957, 24.6957) projected
  line L2 (-33.676, 6.7352) -> (-141.439, 114.4983)
  line L3 (-141.439, 114.4983) -> (-123.4785, 132.4588)
  line L4 (-123.4785, 132.4588) -> (-15.7154, 24.6957)
  line L5 (-134.7038, 112.2532) -> (-132.4588, 114.4983)
  line L6 (-132.4588, 114.4983) -> (-123.4785, 105.518)
  line L7 (-123.4785, 105.518) -> (-125.7236, 103.2729)
  line L8 (-125.7236, 103.2729) -> (-134.7038, 112.2532)
  line L9 (-60.6167, 42.6562) -> (-62.8618, 40.4112)
  line L10 (-62.8618, 40.4112) -> (-53.8815, 31.4309)
  line L11 (-53.8815, 31.4309) -> (-51.6365, 33.676)
  line L12 (-51.6365, 33.676) -> (-60.6167, 42.6562)
  dimension "d38" = 152.4
  dimension "d39" = 25.4
  dimension "d40" = 3.175
  dimension "d41" = 12.7
  dimension "d42" = 6.35
  dimension "d43" = 3.175
  dimension "d44" = 3.175
  dimension "d45" = 12.7
  dimension "d46" = 3.175
  dimension "d47" = 3.175
  dimension "d48" = 88.9
extrude "Extrusion12" add sketch "Sketch12" against normal blind 6.35
sketch "Sketch13" plane through (0, 0, 0) normal (0, 0, -1) x (-1, 0, 0)
  line L0 (224.8896, 215.0325) -> (296.2163, 240.9933) projected
  line L1 (296.2163, 240.9933) -> (296.2163, 247.7508) projected
  line L2 (296.2163, 247.7508) -> (290.2492, 245.579) projected
  line L3 (290.2492, 245.579) -> (289.1633, 248.5625) projected
  line L4 (289.1633, 248.5625) -> (295.1304, 250.7343) projected
  line L5 (295.1304, 250.7343) -> (286.443, 274.6025) projected
  line L6 (286.443, 274.6025) -> (204.2902, 244.7013) projected
  line L7 (278.3151, 241.2353) -> (239.5293, 227.1184) projected
  line L8 (238.4434, 230.102) -> (277.2292, 244.2188) projected
  line L9 (277.2292, 244.2188) -> (278.3151, 241.2353) projected
  line L10 (267.7713, 237.3977) -> (266.6854, 240.3812) projected
  line L11 (267.7713, 237.3977) -> (257.998, 264.2494)
  line L12 (267.7713, 237.3977) -> (269.9431, 231.4306)
extrude "Extrusion13" cut sketch "Sketch13" against normal blind 25.4 contours L12 L7 L9 L8 L11 L6 L5 L4 L3 L2 L1 L0
properties part number "Inner Rail" material "Polycarbonate, Clear"
